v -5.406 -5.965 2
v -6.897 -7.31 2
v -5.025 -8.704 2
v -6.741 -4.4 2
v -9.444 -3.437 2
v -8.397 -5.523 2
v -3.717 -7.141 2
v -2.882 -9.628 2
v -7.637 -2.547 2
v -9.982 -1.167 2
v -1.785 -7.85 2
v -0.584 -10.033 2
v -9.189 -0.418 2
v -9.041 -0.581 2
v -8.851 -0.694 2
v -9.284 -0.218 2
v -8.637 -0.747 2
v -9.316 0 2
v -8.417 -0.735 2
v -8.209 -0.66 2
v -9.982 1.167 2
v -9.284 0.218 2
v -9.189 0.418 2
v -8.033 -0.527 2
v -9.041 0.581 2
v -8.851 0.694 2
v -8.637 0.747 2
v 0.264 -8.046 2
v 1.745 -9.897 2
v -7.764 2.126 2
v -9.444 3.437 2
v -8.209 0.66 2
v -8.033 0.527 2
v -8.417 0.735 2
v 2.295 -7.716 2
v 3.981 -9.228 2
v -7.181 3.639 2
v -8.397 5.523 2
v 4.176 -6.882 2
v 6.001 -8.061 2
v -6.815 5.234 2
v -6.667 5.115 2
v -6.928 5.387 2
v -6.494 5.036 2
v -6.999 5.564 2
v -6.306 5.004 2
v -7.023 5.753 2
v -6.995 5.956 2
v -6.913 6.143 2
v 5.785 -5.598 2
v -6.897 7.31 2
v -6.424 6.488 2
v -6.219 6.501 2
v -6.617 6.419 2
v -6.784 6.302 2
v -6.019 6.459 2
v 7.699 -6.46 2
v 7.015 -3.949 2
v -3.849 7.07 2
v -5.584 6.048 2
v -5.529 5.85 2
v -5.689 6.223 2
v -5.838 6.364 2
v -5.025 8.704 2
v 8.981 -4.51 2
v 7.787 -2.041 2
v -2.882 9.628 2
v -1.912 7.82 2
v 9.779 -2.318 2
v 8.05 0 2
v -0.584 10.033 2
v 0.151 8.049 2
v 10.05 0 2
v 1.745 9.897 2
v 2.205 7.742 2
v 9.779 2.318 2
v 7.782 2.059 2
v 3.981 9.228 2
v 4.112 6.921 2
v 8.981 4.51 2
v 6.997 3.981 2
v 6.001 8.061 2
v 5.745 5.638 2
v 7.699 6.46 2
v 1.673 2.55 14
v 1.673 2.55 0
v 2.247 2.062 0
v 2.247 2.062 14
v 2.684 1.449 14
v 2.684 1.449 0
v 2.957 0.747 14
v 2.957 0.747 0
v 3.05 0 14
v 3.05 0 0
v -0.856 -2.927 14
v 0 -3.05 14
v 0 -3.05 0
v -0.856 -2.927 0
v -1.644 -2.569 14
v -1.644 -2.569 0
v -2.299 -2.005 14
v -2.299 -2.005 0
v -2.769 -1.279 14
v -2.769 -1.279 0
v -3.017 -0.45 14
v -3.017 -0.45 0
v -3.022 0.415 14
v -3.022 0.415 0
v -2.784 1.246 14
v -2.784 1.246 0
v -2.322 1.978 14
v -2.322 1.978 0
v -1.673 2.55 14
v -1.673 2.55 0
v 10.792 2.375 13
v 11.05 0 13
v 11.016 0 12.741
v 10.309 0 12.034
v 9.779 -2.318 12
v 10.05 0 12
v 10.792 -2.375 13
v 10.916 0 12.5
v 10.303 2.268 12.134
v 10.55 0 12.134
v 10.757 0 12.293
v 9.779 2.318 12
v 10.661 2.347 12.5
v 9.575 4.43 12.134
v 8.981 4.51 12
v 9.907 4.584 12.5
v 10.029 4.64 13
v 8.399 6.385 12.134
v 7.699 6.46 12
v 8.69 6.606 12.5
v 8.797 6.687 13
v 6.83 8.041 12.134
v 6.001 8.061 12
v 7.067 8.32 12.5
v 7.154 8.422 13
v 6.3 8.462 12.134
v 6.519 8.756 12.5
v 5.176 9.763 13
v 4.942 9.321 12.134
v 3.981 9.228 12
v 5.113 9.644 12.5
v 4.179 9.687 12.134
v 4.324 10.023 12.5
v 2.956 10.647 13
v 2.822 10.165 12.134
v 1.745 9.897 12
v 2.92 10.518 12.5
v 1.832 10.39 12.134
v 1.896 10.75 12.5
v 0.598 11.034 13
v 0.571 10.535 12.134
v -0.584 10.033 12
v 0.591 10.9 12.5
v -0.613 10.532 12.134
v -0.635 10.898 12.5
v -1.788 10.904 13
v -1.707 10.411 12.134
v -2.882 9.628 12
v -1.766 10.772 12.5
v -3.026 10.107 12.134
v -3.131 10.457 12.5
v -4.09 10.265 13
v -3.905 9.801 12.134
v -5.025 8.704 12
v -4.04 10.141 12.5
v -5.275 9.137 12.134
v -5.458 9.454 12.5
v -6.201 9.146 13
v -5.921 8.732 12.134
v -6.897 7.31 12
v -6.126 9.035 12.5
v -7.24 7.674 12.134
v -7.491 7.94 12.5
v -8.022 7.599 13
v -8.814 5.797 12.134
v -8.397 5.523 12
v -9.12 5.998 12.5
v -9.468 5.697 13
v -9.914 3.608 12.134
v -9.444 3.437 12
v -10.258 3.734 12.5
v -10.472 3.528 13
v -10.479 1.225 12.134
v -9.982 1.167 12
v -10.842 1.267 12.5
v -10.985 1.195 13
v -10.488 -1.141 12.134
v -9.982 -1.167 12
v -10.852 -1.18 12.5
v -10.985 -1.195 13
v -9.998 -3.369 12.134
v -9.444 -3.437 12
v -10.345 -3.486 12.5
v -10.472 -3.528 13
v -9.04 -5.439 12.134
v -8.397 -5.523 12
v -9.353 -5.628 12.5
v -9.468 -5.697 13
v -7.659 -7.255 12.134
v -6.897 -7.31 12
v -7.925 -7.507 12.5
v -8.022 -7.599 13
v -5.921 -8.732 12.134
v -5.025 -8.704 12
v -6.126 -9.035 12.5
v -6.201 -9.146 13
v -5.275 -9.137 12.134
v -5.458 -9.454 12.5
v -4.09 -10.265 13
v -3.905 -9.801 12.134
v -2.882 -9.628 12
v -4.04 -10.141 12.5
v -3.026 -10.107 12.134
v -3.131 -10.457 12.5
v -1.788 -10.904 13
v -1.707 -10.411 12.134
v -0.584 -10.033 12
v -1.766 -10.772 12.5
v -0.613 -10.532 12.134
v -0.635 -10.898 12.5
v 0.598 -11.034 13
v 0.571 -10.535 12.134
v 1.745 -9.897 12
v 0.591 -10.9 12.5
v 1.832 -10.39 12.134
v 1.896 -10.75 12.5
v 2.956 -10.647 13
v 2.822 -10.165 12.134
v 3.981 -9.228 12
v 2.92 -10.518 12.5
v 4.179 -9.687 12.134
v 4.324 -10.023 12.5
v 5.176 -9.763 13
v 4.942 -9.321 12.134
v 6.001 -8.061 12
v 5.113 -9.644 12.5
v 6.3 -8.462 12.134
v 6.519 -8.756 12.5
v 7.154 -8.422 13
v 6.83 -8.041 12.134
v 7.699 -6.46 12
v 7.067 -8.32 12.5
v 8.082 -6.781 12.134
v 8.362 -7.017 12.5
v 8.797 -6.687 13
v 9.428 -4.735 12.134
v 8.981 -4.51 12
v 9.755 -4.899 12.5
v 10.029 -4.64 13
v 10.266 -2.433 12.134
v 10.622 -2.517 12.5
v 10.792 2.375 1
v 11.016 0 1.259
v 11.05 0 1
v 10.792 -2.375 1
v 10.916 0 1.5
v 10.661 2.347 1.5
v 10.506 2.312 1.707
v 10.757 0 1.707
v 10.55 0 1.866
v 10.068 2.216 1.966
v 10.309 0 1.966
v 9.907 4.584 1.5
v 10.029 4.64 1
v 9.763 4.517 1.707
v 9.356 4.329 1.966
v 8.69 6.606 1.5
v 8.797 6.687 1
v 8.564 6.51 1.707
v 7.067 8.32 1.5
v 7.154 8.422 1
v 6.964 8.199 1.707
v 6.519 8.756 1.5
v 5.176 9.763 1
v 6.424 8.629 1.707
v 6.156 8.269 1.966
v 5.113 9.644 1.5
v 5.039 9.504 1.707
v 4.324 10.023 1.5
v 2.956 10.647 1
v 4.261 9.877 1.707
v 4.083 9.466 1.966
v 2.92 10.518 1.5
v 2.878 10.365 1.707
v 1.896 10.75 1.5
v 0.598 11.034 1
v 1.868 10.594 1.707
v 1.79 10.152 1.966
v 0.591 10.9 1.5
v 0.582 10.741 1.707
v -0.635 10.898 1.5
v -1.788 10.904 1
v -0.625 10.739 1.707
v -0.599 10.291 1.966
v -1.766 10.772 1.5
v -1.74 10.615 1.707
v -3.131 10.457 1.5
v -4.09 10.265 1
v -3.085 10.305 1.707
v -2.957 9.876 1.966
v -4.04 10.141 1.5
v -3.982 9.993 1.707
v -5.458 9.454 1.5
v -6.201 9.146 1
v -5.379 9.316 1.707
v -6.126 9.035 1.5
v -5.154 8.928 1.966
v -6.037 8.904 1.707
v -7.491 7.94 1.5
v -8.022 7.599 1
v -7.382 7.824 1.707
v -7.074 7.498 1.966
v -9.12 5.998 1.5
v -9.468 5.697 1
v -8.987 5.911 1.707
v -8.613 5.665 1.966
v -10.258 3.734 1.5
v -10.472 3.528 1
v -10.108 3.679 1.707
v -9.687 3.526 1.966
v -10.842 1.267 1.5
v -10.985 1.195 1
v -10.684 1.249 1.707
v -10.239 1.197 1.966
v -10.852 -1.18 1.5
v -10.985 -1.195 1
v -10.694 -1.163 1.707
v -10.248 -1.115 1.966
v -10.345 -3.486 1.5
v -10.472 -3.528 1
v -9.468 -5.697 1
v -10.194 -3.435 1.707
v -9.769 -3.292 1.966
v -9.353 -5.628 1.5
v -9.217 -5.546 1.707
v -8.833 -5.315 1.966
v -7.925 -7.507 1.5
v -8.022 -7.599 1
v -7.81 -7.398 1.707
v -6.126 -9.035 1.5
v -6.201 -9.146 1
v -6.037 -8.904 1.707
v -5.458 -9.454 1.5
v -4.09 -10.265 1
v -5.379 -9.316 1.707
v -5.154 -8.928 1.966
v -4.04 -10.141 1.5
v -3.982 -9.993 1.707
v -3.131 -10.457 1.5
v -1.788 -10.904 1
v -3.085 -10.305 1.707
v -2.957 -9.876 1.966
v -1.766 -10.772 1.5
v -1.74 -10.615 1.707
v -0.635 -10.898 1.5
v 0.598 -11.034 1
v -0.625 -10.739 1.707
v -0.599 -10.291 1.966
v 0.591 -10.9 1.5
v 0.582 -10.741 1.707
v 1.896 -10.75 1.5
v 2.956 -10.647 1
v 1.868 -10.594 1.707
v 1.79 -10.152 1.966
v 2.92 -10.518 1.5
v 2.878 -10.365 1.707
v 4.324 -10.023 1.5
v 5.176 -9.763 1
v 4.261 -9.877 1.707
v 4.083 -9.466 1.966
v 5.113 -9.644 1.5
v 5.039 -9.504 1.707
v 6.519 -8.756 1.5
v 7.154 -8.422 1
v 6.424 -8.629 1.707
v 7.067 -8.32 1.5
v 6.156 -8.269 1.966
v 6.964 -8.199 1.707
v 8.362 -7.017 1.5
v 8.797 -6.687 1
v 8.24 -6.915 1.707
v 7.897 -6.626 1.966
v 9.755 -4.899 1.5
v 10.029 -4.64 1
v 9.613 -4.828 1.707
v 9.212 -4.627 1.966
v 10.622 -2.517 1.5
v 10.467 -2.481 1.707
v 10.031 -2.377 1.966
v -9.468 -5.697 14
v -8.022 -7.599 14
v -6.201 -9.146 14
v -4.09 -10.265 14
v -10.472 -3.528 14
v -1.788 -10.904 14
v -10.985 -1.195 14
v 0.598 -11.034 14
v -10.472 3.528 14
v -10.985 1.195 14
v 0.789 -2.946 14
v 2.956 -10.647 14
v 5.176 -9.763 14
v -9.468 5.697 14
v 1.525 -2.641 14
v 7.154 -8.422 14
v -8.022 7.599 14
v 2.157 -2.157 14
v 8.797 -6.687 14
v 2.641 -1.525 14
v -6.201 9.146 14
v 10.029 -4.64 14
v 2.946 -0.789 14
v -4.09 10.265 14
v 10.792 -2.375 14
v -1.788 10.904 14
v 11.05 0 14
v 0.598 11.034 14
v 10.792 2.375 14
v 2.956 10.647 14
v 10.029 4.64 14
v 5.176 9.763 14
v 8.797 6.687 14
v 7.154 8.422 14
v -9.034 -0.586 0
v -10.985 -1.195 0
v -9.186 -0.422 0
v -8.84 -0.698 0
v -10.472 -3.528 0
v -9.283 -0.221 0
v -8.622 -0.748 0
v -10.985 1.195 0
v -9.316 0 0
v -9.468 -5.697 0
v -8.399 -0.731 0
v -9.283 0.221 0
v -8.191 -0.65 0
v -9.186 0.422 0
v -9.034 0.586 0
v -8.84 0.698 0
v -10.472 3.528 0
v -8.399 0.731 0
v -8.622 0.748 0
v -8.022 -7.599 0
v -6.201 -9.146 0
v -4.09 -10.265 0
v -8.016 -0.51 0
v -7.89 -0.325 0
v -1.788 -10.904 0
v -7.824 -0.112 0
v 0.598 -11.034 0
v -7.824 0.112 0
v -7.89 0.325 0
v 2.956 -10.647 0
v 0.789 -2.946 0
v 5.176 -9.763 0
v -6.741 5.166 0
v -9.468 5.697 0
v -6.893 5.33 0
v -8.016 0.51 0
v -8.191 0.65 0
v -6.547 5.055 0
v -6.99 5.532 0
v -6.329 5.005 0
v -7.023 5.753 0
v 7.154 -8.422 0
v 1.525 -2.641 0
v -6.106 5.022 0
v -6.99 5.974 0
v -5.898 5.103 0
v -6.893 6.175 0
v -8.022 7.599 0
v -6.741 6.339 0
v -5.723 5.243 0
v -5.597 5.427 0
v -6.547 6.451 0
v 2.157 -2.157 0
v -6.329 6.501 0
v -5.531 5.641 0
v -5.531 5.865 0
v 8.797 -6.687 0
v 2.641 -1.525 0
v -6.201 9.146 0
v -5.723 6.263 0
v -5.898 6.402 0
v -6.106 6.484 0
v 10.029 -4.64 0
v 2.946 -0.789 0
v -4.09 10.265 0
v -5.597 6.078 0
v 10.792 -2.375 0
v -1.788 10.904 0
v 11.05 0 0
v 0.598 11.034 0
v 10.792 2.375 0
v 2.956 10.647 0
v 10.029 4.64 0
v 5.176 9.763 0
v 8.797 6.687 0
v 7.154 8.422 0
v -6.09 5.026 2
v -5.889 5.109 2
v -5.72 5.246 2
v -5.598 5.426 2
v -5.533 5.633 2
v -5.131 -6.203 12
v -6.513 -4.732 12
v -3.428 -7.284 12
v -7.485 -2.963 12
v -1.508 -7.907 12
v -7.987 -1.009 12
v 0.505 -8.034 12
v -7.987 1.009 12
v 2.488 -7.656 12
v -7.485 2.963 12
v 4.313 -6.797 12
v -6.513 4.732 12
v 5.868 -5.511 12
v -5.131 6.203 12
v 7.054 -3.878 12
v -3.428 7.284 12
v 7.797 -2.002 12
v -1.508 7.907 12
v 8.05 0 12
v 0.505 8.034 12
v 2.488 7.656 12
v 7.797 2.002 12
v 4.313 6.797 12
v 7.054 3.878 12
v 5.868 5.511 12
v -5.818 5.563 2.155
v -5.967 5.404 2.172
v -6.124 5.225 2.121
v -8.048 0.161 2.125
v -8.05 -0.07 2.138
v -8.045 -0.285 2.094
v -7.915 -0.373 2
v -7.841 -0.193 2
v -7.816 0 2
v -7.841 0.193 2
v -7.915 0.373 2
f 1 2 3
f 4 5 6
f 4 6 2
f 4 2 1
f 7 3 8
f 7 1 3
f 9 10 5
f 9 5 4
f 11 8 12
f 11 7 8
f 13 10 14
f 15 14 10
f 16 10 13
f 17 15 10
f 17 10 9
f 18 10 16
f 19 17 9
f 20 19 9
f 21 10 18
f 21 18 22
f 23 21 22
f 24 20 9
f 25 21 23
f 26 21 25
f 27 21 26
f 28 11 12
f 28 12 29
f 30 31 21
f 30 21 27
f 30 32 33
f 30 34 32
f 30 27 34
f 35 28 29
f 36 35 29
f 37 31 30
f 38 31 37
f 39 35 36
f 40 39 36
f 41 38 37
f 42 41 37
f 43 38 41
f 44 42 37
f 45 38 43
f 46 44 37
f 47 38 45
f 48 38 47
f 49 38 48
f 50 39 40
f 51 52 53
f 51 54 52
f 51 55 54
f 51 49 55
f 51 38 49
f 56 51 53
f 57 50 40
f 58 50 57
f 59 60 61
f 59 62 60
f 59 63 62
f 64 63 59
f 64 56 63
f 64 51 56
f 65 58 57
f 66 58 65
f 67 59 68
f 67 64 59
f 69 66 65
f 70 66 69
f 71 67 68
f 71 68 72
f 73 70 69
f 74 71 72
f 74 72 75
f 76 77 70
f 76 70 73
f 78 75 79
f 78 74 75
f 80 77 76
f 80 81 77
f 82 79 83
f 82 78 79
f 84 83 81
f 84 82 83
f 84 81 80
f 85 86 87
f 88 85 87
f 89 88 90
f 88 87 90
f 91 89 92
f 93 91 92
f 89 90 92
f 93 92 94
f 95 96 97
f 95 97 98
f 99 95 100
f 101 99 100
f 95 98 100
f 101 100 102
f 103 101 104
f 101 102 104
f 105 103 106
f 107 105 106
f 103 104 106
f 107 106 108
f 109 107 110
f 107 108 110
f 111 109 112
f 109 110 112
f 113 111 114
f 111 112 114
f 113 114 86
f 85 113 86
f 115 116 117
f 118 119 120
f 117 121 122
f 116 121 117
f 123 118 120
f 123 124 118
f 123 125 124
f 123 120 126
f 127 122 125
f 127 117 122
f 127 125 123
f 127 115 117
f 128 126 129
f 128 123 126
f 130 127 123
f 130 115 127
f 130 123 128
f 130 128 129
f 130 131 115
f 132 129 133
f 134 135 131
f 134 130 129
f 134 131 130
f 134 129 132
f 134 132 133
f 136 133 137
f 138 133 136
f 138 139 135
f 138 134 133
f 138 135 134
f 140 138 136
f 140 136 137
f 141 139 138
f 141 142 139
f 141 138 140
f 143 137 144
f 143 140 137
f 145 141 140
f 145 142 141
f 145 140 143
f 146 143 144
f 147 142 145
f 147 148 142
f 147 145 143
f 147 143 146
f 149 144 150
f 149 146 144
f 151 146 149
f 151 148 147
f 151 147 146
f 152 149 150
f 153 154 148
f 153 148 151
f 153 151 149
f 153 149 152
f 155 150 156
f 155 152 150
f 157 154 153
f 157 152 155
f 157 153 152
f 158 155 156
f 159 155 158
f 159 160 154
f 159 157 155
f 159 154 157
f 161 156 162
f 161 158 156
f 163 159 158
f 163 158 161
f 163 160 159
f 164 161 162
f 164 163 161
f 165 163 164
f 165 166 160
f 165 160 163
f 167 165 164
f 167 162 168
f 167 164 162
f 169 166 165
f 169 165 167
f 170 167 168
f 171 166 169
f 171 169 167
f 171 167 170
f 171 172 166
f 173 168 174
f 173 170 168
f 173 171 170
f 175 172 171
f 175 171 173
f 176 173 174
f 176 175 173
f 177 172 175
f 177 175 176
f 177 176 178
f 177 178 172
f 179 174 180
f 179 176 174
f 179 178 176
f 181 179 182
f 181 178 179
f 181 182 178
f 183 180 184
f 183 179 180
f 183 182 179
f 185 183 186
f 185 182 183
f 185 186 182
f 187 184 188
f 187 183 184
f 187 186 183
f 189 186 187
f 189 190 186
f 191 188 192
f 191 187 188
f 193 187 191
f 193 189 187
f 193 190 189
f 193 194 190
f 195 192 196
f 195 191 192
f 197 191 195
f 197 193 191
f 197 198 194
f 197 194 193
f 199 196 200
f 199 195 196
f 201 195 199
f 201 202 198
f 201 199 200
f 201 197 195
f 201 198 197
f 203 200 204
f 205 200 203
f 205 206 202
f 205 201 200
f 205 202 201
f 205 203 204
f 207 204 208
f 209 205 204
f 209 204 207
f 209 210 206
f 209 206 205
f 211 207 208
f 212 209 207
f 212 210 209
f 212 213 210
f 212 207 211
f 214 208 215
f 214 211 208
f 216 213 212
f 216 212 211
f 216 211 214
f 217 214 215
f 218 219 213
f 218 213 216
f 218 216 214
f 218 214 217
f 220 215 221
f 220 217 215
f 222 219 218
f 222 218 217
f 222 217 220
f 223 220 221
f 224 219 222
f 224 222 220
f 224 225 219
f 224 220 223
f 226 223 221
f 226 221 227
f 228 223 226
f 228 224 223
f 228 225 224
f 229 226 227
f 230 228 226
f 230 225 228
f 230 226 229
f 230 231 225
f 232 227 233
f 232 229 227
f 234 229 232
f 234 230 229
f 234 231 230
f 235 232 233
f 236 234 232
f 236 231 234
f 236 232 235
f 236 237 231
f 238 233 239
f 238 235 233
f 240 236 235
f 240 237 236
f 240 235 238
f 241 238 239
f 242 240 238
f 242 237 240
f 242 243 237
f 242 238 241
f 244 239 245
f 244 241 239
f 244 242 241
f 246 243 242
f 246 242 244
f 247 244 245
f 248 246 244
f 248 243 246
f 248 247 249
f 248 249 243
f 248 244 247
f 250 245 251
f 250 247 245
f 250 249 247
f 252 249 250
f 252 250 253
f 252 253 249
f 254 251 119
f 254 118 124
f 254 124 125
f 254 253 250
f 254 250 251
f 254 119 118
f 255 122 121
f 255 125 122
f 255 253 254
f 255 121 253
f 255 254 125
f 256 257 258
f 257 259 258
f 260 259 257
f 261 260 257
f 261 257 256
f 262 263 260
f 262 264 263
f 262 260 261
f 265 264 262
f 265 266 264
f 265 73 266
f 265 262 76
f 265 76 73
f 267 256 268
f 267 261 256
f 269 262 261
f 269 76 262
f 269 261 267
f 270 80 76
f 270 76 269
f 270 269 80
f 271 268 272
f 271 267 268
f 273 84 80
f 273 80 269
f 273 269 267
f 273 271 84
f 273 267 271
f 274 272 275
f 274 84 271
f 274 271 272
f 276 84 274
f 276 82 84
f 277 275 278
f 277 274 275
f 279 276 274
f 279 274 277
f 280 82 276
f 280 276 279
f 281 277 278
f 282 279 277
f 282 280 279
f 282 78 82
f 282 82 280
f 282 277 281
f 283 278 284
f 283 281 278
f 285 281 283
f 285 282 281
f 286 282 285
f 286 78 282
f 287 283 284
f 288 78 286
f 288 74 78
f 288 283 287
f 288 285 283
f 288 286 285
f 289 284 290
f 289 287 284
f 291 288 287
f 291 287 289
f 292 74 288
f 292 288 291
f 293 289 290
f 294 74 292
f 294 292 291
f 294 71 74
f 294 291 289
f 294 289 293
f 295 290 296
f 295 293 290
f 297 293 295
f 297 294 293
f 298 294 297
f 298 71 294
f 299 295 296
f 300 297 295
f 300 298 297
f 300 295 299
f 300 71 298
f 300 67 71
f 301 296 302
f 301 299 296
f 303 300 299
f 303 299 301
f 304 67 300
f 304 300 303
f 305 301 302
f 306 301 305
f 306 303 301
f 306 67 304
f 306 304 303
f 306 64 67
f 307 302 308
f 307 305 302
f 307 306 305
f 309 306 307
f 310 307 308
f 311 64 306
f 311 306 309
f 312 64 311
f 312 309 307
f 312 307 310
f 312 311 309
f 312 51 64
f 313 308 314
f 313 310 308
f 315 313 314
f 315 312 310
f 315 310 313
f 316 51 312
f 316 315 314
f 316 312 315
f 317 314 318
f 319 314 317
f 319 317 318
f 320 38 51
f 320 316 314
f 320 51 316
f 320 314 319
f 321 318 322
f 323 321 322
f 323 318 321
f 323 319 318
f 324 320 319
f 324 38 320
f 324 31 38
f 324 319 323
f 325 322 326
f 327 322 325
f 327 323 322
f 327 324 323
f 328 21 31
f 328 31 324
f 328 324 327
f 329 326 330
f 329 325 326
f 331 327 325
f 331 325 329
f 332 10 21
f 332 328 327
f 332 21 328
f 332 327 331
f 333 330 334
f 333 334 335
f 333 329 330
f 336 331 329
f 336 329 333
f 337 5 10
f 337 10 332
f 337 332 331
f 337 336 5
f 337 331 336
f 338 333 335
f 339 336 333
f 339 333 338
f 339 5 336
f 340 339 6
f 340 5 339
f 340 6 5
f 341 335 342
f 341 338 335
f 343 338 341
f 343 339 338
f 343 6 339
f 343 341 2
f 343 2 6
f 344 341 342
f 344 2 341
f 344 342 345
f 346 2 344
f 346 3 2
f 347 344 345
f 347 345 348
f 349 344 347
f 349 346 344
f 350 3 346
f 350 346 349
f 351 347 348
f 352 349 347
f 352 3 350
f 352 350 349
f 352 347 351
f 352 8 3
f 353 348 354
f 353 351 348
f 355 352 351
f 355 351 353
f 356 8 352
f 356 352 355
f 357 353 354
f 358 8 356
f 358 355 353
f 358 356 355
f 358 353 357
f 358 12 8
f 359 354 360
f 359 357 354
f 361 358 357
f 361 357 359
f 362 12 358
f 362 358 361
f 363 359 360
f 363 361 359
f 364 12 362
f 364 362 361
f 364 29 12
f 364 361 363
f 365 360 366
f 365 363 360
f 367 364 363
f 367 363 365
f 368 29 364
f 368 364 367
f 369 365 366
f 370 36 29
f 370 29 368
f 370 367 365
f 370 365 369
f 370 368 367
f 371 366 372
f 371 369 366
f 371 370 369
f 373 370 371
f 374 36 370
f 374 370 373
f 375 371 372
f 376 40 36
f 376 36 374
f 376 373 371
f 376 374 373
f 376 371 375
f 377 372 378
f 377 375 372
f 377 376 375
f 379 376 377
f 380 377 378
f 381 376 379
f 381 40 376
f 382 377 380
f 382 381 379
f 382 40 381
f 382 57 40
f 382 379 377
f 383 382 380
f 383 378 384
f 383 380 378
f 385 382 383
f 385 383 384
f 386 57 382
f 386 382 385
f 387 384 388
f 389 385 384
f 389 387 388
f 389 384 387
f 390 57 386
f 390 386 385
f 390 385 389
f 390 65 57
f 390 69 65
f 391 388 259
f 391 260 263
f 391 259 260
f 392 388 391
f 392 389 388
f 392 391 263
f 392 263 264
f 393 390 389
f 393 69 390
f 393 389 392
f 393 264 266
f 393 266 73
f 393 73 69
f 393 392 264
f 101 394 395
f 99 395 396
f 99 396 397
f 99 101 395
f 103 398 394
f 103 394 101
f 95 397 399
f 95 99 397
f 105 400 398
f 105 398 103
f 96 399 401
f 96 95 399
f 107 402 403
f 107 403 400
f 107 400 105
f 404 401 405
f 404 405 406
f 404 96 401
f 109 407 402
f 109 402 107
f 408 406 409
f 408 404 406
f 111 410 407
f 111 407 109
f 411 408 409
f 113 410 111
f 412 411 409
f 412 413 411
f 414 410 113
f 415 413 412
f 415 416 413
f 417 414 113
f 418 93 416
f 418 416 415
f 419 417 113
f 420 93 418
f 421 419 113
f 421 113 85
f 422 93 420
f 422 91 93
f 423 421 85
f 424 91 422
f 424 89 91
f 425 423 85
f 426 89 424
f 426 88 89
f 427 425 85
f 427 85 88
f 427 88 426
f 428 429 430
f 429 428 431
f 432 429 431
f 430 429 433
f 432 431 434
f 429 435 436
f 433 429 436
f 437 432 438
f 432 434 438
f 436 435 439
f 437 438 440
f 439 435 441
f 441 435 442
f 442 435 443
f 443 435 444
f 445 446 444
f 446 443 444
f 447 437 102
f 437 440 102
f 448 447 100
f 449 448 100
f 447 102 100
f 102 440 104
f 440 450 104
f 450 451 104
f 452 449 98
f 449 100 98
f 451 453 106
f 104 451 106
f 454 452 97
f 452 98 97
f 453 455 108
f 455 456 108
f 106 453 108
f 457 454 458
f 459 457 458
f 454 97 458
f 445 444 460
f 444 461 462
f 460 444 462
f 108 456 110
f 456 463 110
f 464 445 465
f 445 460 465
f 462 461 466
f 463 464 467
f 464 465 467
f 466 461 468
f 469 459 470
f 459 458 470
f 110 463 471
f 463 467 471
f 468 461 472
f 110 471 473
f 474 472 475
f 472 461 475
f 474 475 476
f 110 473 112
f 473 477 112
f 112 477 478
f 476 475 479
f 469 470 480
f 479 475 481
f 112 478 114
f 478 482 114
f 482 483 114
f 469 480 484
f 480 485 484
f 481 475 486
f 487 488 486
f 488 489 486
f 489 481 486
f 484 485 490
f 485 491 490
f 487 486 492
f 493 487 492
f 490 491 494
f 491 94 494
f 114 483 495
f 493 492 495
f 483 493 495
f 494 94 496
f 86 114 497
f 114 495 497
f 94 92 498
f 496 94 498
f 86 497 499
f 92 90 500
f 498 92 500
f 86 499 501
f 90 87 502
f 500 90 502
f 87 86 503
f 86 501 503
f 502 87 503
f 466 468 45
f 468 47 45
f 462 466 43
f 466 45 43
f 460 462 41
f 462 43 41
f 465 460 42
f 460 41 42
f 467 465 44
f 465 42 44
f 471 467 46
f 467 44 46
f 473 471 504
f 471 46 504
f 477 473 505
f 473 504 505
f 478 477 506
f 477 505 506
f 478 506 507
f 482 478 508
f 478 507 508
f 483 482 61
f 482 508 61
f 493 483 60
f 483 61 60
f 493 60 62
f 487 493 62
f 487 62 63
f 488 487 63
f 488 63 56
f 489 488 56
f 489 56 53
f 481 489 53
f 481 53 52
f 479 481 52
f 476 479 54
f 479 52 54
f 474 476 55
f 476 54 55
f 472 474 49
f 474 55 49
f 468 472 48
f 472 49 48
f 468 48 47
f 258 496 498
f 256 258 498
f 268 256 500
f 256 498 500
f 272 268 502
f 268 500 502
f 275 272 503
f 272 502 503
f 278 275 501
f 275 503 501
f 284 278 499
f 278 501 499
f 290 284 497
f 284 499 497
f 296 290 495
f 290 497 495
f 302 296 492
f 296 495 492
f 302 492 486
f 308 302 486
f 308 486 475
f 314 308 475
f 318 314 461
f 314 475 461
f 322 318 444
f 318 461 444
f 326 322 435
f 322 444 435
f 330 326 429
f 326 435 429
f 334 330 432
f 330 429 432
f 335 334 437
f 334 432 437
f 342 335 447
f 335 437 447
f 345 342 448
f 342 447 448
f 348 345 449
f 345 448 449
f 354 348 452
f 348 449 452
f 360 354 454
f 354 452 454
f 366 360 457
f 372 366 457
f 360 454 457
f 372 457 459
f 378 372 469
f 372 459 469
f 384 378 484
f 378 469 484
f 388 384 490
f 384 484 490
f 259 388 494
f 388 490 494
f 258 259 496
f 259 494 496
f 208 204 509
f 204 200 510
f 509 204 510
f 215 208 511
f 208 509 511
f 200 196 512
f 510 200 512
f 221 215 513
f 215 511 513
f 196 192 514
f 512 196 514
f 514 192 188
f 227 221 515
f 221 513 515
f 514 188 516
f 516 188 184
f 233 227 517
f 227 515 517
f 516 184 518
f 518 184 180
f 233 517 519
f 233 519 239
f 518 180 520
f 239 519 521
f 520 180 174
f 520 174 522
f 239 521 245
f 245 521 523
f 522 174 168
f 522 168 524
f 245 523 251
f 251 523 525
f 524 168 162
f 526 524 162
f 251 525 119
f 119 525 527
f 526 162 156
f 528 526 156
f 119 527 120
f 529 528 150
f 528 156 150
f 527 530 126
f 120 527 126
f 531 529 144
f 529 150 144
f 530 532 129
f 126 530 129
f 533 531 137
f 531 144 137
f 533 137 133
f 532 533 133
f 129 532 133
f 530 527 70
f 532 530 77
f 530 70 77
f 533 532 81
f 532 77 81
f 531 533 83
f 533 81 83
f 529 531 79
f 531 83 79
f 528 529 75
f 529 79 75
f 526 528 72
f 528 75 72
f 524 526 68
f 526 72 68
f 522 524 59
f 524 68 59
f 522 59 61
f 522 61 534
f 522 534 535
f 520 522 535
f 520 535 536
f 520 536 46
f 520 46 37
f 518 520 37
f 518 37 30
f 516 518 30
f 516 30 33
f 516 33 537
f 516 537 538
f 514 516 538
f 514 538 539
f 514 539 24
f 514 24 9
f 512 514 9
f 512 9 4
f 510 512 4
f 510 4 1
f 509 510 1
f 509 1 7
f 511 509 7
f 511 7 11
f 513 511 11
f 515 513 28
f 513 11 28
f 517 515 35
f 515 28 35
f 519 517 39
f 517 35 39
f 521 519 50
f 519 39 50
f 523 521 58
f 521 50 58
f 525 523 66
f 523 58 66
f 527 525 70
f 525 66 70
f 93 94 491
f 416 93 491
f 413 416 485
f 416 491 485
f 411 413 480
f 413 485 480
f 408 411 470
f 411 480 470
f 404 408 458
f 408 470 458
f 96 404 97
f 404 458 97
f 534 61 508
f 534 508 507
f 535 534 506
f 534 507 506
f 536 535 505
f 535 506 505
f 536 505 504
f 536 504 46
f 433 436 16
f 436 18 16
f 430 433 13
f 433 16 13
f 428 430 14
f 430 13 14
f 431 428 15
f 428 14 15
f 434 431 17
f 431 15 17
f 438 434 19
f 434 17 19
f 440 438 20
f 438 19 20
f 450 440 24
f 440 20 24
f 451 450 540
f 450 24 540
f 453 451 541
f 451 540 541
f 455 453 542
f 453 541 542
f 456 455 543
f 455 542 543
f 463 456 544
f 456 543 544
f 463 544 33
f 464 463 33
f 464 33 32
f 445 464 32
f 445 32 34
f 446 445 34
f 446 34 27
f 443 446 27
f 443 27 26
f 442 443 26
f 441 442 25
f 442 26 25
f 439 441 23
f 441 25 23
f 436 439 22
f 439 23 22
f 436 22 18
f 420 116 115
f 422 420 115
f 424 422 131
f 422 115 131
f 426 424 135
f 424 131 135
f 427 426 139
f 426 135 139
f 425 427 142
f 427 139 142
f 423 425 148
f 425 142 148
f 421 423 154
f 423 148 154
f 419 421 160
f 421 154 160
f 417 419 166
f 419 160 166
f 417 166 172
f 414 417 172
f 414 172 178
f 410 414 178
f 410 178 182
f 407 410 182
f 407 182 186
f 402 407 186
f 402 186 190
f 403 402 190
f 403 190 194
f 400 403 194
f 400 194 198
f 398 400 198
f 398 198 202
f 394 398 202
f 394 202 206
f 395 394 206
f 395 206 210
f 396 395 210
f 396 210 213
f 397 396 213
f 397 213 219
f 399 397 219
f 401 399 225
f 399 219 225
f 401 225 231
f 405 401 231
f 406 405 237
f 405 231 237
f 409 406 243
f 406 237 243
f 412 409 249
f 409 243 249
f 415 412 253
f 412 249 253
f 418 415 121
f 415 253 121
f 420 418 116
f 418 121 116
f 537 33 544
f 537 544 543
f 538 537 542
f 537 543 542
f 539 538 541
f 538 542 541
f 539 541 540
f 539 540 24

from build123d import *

# Parameters (mm, degrees)
F0_R     = 8.05
F1_DEPTH = 14
F0_R_2   = 11.05
F2_DEPTH = 14
F3_DEPTH = 12
F4_DEPTH = 2
F5_R     = 1
F6_D     = 1.5
F6_DEPTH = 2
F6_TIP   = 0.4506454643
F7_D     = 1.5
F7_DEPTH = 2
F7_TIP   = 0.4506454643


with BuildPart() as f1:
    # F0 (on Top) → F1 (new body)
    with BuildSketch(Plane.XY):
        Circle(F0_R)
        with BuildLine():
            ThreePointArc((1.6733200531, 2.55), (2.6838522837, 1.4489433802), (3.05, 0))
            ThreePointArc((3.05, 0), (2.1566756826, -2.1566756826), (0, -3.05))
            ThreePointArc((0, -3.05), (-2.9223278392, -0.8732124598), (-1.6733200531, 2.55))
            ThreePointArc((-1.6733200531, 2.55), (0, 3.05), (1.6733200531, 2.55))
        make_face(mode=Mode.SUBTRACT)
        with BuildLine():
            Line((0, 2.55), (1.6733200531, 2.55))
            ThreePointArc((1.6733200531, 2.55), (0, 3.05), (-1.6733200531, 2.55))
            Line((-1.6733200531, 2.55), (0, 2.55))
        make_face()
    extrude(amount=F1_DEPTH)

    # F0 (on Top) → F2 (join)
    with BuildSketch(Plane.XY):
        Circle(F0_R_2)
        Circle(F0_R, mode=Mode.SUBTRACT)
    extrude(amount=F2_DEPTH)

    # F0 (on Top) → F3 (cut)
    with BuildSketch(Plane.XY):
        Circle(F0_R_2)
        Circle(F0_R, mode=Mode.SUBTRACT)
    extrude(amount=F3_DEPTH, mode=Mode.SUBTRACT)

    # F0 (on Top) → F4 (join)
    with BuildSketch(Plane.XY):
        Circle(F0_R_2)
        Circle(F0_R, mode=Mode.SUBTRACT)
    extrude(amount=F4_DEPTH)

    # F5
    f5_edges = [f1.edges().sort_by_distance(p)[0] for p in [
        (-11.05, 0, 12),
        (-11.05, 0, 2),
    ]]
    fillet(f5_edges, radius=F5_R)

    # F6
    with Locations(Plane(origin=(0, 0, 0), x_dir=(1, 0, 0), z_dir=(0, 0, -1))):
        with Locations((-8.5659669712, 0)):
            Hole(F6_D / 2, depth=F6_DEPTH)
            with Locations((0, 0, -(F6_DEPTH + F6_TIP / 2))):  # 118° drill point
                Cone(0, F6_D / 2, F6_TIP, mode=Mode.SUBTRACT)

    # F7
    with Locations(Plane(origin=(0, 0, 0), x_dir=(1, 0, 0), z_dir=(0, 0, -1))):
        with Locations((-6.2731071375, -5.7528195903)):
            Hole(F7_D / 2, depth=F7_DEPTH)
            with Locations((0, 0, -(F7_DEPTH + F7_TIP / 2))):  # 118° drill point
                Cone(0, F7_D / 2, F7_TIP, mode=Mode.SUBTRACT)


solid = f1.part
